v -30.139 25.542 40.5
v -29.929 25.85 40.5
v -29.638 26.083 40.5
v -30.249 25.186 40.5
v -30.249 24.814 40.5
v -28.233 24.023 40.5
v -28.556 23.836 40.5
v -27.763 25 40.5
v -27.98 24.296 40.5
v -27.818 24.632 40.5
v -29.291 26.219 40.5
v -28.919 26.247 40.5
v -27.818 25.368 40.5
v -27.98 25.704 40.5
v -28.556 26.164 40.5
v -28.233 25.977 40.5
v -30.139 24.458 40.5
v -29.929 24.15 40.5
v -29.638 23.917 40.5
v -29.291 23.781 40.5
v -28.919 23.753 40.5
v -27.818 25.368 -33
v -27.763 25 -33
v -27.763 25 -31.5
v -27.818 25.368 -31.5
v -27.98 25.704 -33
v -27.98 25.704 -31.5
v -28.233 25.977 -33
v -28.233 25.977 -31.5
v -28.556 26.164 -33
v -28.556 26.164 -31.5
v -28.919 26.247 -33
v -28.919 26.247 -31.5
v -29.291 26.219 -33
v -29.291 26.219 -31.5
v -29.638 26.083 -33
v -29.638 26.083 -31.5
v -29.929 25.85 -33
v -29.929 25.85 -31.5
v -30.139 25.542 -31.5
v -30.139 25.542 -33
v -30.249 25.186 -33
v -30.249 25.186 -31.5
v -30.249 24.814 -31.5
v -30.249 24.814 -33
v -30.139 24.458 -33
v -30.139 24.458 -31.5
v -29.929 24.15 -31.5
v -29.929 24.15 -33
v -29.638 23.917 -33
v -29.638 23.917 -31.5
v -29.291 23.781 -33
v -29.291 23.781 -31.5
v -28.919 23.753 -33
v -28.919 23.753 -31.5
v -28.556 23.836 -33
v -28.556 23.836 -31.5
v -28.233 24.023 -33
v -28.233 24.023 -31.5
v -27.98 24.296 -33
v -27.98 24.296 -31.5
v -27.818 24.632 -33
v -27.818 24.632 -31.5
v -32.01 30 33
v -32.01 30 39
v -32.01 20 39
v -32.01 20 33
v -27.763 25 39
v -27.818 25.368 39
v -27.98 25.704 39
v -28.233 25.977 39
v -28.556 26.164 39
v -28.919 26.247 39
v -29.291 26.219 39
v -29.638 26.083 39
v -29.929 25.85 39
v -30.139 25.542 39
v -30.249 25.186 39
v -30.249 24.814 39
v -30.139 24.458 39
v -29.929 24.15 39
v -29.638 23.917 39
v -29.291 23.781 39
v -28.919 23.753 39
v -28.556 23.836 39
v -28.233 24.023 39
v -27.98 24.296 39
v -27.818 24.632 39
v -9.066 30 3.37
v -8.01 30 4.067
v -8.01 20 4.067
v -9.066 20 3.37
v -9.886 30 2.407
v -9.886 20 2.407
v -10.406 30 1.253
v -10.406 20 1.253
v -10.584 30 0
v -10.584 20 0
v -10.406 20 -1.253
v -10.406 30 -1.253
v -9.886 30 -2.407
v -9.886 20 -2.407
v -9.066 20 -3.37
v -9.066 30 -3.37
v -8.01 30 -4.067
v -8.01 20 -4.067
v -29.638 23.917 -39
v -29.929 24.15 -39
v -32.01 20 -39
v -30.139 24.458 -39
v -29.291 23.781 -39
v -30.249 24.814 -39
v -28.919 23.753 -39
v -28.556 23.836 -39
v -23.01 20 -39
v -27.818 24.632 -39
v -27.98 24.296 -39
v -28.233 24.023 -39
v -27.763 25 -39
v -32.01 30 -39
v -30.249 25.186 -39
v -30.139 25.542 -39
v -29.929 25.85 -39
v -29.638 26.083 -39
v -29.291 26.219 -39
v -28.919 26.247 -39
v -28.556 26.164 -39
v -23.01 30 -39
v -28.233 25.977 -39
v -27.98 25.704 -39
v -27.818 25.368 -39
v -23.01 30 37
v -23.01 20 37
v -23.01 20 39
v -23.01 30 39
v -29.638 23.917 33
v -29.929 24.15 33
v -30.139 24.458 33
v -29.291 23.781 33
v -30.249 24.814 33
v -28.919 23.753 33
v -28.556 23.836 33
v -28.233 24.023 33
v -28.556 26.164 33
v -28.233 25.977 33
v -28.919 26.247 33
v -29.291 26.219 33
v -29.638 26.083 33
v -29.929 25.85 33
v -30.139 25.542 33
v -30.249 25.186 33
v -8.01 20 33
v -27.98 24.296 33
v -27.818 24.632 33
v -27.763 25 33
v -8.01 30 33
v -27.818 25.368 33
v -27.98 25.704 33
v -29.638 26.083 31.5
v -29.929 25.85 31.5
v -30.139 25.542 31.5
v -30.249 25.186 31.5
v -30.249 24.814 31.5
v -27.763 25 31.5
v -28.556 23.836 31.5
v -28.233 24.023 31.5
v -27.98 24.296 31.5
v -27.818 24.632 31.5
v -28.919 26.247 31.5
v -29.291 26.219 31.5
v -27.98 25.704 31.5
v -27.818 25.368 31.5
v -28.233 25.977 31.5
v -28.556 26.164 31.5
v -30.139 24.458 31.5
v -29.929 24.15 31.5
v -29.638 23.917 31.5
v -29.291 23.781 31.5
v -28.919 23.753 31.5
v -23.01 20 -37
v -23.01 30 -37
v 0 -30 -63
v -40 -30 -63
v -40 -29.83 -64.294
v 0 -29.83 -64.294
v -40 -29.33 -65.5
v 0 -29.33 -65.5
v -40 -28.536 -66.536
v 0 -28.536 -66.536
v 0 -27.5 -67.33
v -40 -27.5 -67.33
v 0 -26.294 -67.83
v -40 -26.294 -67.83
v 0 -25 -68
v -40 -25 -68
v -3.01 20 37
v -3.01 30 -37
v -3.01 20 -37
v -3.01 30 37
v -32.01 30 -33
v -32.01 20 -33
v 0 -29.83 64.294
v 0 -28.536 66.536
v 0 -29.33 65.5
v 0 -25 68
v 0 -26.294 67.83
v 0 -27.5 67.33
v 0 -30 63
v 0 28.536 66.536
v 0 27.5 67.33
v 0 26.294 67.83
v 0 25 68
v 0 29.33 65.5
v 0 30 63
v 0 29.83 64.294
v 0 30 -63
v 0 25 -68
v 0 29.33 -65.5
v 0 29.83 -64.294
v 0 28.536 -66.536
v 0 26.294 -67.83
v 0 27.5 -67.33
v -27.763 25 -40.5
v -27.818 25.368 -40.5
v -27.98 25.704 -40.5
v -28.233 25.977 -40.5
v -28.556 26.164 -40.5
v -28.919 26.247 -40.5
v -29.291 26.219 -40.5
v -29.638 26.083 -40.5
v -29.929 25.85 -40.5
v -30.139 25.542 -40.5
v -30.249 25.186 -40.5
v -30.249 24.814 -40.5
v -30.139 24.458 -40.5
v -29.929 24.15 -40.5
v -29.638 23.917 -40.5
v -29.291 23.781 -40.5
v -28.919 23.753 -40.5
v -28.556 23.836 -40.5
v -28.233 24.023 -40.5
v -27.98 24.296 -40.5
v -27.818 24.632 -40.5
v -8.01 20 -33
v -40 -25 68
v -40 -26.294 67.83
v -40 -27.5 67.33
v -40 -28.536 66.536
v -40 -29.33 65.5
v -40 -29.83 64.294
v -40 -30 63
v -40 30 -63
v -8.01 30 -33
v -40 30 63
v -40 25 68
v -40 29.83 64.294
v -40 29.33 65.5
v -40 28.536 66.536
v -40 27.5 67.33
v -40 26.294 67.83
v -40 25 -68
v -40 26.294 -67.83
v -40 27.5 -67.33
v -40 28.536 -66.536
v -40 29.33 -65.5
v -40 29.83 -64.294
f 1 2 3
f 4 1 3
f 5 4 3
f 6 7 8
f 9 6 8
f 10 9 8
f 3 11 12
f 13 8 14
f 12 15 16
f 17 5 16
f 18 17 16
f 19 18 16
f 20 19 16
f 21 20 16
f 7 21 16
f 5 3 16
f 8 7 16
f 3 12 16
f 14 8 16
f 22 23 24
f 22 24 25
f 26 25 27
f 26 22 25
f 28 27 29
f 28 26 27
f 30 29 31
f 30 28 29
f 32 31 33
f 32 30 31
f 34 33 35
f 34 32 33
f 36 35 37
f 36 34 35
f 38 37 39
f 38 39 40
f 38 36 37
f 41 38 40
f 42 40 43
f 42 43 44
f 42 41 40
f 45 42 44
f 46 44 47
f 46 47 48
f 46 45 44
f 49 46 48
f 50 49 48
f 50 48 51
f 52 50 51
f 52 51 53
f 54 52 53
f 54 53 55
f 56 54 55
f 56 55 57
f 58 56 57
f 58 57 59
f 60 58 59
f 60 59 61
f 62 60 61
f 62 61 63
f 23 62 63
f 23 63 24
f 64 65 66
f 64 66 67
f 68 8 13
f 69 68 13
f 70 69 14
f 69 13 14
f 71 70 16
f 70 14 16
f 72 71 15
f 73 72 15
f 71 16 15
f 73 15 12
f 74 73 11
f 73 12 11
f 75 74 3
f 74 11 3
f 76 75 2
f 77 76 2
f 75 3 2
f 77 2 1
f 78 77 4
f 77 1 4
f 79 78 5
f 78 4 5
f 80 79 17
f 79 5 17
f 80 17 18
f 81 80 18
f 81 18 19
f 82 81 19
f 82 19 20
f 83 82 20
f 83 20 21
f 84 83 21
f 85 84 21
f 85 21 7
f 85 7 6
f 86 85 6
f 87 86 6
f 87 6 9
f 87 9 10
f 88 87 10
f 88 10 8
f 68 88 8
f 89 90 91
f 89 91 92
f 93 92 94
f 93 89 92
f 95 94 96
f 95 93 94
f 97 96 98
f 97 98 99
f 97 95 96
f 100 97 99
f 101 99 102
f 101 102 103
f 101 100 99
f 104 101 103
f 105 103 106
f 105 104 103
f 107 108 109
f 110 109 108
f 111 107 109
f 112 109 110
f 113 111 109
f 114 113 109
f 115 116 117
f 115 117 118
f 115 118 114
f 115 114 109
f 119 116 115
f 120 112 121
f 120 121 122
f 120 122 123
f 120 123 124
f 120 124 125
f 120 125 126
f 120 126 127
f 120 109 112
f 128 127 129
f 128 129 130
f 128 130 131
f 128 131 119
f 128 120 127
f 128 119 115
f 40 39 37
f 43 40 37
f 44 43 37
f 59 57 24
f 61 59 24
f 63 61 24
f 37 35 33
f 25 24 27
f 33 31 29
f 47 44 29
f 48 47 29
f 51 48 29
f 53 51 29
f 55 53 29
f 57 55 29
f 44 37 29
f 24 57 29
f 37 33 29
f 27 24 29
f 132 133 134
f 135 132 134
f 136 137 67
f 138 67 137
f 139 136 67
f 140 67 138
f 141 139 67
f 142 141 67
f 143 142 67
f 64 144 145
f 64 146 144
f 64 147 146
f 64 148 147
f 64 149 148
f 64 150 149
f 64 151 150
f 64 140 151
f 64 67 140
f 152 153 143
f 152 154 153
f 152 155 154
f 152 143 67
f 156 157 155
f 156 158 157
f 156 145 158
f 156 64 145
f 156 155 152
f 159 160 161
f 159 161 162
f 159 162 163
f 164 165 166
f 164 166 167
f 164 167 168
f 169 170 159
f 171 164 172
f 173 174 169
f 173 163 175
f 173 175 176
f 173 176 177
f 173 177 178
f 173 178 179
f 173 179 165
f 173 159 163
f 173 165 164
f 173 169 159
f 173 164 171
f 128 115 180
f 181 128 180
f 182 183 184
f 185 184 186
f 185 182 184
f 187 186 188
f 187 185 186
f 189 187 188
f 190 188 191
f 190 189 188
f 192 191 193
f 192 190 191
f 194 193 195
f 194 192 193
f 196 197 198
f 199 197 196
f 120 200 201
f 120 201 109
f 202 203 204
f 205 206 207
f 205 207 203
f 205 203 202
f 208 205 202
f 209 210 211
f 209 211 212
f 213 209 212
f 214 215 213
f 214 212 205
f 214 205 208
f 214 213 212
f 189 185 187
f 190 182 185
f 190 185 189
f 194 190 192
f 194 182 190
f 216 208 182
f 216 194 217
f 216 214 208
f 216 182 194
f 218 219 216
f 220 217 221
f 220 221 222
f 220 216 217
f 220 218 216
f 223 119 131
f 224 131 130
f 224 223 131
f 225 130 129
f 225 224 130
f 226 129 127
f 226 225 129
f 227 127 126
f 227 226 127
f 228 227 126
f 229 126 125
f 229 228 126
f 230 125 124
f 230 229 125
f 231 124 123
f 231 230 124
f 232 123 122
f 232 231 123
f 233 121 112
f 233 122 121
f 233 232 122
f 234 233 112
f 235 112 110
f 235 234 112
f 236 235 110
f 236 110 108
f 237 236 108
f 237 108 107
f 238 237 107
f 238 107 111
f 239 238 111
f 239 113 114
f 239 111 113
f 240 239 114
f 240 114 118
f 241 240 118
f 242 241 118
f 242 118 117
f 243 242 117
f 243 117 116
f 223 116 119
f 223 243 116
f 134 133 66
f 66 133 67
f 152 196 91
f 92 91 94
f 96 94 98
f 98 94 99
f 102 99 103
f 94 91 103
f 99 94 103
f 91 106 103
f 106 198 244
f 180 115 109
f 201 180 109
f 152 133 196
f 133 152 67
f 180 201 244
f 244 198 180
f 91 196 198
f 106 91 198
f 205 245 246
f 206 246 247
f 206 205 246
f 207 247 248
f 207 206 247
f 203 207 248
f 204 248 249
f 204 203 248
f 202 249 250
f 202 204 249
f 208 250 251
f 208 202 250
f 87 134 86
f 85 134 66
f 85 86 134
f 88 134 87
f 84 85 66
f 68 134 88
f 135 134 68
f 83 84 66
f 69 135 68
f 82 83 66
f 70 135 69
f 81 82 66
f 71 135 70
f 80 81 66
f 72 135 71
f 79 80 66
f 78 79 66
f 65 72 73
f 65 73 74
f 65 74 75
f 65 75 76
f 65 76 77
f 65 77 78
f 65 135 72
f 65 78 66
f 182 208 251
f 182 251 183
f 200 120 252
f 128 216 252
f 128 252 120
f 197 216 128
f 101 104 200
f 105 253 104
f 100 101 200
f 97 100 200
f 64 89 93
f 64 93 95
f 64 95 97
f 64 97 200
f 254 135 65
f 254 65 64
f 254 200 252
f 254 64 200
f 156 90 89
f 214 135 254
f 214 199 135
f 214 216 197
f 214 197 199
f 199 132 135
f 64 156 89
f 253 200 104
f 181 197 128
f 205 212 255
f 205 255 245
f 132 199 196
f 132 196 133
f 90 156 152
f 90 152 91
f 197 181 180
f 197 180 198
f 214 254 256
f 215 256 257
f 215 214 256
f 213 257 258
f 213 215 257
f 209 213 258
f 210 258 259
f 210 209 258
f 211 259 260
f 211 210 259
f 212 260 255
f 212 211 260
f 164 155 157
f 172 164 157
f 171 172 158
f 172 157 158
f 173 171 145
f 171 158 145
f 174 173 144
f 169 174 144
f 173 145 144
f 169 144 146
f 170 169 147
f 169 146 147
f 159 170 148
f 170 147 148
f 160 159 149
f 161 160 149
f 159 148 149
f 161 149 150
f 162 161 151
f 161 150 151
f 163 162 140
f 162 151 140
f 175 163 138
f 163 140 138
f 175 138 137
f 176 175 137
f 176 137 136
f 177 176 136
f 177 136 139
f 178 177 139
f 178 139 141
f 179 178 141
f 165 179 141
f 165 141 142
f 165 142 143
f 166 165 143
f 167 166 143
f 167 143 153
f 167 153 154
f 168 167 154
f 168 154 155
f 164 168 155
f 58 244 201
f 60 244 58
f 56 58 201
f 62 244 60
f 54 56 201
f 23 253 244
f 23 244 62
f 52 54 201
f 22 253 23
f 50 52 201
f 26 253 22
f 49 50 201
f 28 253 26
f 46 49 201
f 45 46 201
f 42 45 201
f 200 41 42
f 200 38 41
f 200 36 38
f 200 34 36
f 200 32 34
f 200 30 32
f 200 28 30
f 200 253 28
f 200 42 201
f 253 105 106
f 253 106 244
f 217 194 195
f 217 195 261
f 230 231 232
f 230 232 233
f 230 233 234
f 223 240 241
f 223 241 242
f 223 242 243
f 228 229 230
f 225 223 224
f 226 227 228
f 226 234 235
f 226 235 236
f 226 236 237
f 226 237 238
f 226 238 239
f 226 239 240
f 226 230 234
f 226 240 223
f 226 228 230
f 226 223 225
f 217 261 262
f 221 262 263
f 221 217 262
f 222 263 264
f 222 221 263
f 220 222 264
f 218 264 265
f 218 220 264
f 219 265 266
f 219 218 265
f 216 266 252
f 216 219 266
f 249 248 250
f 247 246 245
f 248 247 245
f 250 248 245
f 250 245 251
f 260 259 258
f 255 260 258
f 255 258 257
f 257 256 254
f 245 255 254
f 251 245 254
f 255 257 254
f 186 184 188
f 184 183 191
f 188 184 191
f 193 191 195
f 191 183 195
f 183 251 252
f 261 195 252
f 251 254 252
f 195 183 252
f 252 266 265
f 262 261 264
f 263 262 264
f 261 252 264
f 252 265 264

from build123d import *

# Parameters (mm, degrees)
BOSS_EXTRUDE1_DEPTH = 40
CUT_EXTRUDE1_DEPTH  = 10
CUT_EXTRUDE2_START  = -1.5
SKETCH5_R           = 1.25
CUT_EXTRUDE2_DEPTH  = 9


with BuildPart() as part:
    # Sketch1 → Boss-Extrude1 (new body)
    with BuildSketch(Plane(origin=(0, 0, 0), x_dir=(0, 0, -1), z_dir=(1, 0, 0))):
        with BuildLine():
            Line((-63, -30), (63, -30))
            ThreePointArc((63, -30), (66.535533906, -28.535533906), (68, -25))
            Line((68, -25), (68, 25))
            ThreePointArc((68, 25), (66.535533906, 28.535533906), (63, 30))
            Line((63, 30), (-63, 30))
            ThreePointArc((-63, 30), (-66.535533906, 28.535533906), (-68, 25))
            Line((-68, 25), (-68, -25))
            ThreePointArc((-68, -25), (-66.535533906, -28.535533906), (-63, -30))
        make_face()
    extrude(amount=-BOSS_EXTRUDE1_DEPTH)

    # Sketch3 → Cut-Extrude1 (cut)
    with BuildSketch(Plane(origin=(0, 30, 0), x_dir=(1, 0, 0), z_dir=(0, 1, 0))):
        with BuildLine():
            Line((-3.009553383, -37), (-23.009553383, -37))
            Line((-23.009553383, -37), (-23.009553383, -39))
            Line((-23.009553383, -39), (-32.009553383, -39))
            Line((-32.009553383, -39), (-32.009553383, -33))
            Line((-32.009553383, -33), (-8.009553383, -33))
            Line((-8.009553383, -33), (-8.009553383, -4.067313184))
            ThreePointArc((-8.009553383, -4.067313184), (-10.584205762, 0), (-8.009553383, 4.067313184))
            Line((-8.009553383, 4.067313184), (-8.009553383, 33))
            Line((-8.009553383, 33), (-32.009553383, 33))
            Line((-32.009553383, 33), (-32.009553383, 39))
            Line((-32.009553383, 39), (-23.009553383, 39))
            Line((-23.009553383, 39), (-23.009553383, 37))
            Line((-23.009553383, 37), (-3.009553383, 37))
            Line((-3.009553383, 37), (-3.009553383, -37))
        make_face()
    extrude(amount=-CUT_EXTRUDE1_DEPTH, mode=Mode.SUBTRACT)

    # Sketch5 → Cut-Extrude2 (cut)
    with BuildSketch(Plane.XY.offset(-39).offset(CUT_EXTRUDE2_START)):
        with Locations((-29.012566775, 25)):
            Circle(SKETCH5_R)
    cut_extrude2 = extrude(amount=CUT_EXTRUDE2_DEPTH, mode=Mode.SUBTRACT)

    # Mirror1: Cut-Extrude2 across plane
    add(cut_extrude2.mirror(Plane.XY), mode=Mode.SUBTRACT)


solid = part.part
